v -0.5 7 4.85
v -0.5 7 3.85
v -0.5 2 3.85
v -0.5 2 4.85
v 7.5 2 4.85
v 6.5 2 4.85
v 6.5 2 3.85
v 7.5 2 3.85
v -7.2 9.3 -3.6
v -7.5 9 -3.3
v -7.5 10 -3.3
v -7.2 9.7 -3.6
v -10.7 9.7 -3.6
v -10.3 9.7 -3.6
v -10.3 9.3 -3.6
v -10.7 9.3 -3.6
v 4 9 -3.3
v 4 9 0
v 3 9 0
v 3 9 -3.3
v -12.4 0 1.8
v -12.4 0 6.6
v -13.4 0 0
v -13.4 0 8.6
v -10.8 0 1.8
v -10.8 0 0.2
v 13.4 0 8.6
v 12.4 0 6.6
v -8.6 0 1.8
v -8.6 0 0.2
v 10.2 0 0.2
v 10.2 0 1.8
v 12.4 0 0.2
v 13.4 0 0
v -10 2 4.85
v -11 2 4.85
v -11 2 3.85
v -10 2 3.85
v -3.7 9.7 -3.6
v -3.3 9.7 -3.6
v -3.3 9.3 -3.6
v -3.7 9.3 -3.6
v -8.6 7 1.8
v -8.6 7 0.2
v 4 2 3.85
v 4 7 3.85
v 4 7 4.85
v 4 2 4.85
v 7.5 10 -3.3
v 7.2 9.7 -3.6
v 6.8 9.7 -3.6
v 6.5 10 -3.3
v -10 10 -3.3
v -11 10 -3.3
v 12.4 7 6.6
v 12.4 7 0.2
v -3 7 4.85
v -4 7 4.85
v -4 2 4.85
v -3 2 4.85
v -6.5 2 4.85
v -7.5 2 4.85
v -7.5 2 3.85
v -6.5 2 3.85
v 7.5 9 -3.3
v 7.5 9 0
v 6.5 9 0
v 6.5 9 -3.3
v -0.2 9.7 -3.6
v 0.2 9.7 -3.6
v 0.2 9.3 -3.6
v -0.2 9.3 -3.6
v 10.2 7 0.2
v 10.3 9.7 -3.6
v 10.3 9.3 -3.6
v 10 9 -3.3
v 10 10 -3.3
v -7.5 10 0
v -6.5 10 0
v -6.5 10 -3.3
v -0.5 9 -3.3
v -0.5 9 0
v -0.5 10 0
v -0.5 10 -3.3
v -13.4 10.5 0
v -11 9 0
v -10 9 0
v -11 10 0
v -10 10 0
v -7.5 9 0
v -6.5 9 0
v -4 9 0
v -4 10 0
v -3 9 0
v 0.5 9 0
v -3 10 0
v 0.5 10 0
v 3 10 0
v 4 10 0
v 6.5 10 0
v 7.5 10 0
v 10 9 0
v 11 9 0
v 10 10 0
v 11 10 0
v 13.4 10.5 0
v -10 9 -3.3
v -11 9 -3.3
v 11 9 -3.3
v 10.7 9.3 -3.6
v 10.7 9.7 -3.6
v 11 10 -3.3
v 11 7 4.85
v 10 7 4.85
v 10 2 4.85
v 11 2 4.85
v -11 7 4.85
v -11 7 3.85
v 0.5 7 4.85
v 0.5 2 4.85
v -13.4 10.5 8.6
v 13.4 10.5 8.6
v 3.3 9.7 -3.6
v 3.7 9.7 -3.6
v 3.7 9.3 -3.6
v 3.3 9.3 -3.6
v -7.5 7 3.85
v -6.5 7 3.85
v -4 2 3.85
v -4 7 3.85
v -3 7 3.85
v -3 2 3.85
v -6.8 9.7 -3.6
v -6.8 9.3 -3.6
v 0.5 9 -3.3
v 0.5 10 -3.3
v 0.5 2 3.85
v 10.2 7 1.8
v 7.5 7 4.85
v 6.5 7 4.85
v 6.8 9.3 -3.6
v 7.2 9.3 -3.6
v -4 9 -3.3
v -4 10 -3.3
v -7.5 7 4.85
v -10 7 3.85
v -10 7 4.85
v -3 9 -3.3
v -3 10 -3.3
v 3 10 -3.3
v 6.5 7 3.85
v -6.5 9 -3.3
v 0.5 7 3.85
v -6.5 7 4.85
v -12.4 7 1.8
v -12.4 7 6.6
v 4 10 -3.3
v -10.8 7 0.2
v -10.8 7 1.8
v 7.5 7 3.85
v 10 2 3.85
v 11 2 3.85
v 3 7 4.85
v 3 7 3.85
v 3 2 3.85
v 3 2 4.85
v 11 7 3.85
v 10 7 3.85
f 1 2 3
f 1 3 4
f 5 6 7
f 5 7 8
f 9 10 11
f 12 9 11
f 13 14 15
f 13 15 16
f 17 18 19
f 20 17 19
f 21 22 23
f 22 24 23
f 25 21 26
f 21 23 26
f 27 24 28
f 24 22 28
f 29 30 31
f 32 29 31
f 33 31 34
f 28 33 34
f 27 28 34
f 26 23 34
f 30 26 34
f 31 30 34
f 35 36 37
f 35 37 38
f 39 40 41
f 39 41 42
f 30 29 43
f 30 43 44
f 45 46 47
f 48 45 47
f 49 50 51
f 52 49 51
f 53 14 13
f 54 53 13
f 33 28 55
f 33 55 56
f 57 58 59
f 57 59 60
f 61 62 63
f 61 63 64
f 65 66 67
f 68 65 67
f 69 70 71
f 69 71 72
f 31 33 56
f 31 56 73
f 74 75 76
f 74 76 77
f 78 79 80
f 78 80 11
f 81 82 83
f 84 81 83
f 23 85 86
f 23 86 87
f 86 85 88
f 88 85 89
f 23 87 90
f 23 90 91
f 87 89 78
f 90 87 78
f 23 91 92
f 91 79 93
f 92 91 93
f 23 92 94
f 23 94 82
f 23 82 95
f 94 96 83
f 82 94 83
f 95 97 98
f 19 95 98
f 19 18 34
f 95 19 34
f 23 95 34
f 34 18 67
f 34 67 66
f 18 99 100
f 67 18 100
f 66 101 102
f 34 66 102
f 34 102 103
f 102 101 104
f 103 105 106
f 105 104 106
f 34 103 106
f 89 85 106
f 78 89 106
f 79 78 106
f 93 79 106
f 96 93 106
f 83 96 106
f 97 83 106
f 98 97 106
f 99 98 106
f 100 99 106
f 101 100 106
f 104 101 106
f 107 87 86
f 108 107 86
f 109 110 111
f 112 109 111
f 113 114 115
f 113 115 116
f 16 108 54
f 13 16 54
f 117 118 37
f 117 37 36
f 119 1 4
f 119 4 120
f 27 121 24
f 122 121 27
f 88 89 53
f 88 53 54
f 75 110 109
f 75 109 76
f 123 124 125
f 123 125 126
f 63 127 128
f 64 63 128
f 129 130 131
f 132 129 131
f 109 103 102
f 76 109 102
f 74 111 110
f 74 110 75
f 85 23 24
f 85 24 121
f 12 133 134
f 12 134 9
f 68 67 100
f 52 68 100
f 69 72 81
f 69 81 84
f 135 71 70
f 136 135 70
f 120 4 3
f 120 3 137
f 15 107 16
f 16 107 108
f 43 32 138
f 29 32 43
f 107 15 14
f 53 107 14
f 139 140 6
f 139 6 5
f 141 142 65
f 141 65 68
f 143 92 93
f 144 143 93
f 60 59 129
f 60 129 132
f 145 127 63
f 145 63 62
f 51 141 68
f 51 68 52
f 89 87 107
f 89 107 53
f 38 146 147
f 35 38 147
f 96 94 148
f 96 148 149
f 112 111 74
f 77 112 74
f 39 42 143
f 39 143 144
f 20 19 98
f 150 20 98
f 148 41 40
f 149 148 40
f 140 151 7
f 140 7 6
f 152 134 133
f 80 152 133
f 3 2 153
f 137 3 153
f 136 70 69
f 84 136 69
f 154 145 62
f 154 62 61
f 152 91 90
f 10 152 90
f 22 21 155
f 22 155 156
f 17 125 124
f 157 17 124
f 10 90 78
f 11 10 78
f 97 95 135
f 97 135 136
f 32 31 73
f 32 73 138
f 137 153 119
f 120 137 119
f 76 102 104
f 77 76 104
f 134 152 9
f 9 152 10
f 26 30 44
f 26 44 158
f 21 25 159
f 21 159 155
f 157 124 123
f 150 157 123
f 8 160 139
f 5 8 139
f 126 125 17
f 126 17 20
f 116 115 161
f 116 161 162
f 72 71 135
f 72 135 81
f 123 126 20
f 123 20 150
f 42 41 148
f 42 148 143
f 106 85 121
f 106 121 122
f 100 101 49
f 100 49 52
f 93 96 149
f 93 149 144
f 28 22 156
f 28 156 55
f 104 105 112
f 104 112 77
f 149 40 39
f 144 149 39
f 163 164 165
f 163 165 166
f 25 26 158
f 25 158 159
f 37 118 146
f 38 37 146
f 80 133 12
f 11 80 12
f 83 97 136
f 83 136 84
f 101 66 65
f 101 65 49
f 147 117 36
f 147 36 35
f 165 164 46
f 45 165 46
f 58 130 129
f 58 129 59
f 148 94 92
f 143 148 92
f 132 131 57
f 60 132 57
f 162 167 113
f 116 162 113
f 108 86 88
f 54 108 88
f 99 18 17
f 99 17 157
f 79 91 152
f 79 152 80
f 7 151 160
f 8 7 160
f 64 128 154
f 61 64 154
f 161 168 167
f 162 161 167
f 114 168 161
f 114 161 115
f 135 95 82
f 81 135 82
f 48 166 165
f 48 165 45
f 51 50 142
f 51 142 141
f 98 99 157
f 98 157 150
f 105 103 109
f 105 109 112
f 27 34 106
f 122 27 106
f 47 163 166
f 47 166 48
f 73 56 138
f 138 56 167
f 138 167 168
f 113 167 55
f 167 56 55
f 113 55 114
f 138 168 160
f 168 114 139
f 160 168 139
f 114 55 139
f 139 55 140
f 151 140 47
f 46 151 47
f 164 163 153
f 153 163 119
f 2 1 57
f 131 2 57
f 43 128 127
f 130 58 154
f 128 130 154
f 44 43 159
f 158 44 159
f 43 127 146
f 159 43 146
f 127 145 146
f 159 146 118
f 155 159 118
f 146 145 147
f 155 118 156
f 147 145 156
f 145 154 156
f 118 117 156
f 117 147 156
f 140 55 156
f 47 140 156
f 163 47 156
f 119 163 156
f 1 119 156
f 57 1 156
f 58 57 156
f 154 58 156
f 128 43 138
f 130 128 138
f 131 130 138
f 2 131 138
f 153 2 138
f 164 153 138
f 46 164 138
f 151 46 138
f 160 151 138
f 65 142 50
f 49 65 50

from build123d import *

# Parameters (mm, degrees)
SKETCH_1_W                         = 26.8
SKETCH_1_H                         = 10.5
EXTRUDE_1_DEPTH                    = 8.6
CUT_EXTRUDE_1_DEPTH                = 7
EXTRUDE_START                      = -5
SKETCH_3_W                         = 1
SKETCH_3_H                         = 1
EXTRUDE_2_DEPTH                    = 8.6
CHAMFER_1_SIZE                     = 0.3
SKETCH_4_W                         = 1
SKETCH_4_H                         = 1
EXTRUDE_3_DEPTH                    = 5
PATTERN_LINEAR_1_COUNT             = 7
PATTERN_LINEAR_1_PITCH             = 3.5
CHAMFER_1_OF_PATTERN_LINEAR_1_SIZE = 0.3


with BuildPart() as part:
    # Эскиз1 → Бобышка-Вытянуть1 (new body)
    with BuildSketch(Plane.XY):
        with Locations((0, 5.25)):
            Rectangle(SKETCH_1_W, SKETCH_1_H)
    extrude(amount=EXTRUDE_1_DEPTH)

    # Эскиз2 → Вырез-Вытянуть1 (cut)
    with BuildSketch(Plane.XZ):
        Polygon((-12.4, 6.6), (12.4, 6.6), (12.4, 0.2), (10.2, 0.2), (10.2, 1.8), (-8.6, 1.8), (-8.6, 0.2), (-10.8, 0.2), (-10.8, 1.8), (-12.4, 1.8), align=None)
    extrude(amount=-CUT_EXTRUDE_1_DEPTH, mode=Mode.SUBTRACT)

    # Эскиз3 → Бобышка-Вытянуть2 (add)
    with BuildSketch(Plane(origin=(0, 0, 0), x_dir=(-1, 0, 0), z_dir=(0, 0, -1)).offset(EXTRUDE_START)):
        with Locations((10.5, 9.5)):
            Rectangle(SKETCH_3_W, SKETCH_3_H)
    extrude_2 = extrude(amount=EXTRUDE_2_DEPTH)

    # Фаска1
    chamfer_1_edges = [part.edges().sort_by_distance(p)[0] for p in [
        (-10, 9.5, -3.6),
        (-10.5, 9, -3.6),
        (-11, 9.5, -3.6),
        (-10.5, 10, -3.6),
    ]]
    chamfer(chamfer_1_edges, length=CHAMFER_1_SIZE)

    # Эскиз4 → Бобышка-Вытянуть3 (add)
    with BuildSketch(Plane.XZ.offset(-7)):
        with Locations((-10.5, 4.35)):
            Rectangle(SKETCH_4_W, SKETCH_4_H)
    extrude_3 = extrude(amount=EXTRUDE_3_DEPTH)

    # Линейный массив1: Бобышка-Вытянуть2, Бобышка-Вытянуть3 ×7
    with Locations(*[(i * PATTERN_LINEAR_1_PITCH, 0, 0) for i in range(1, PATTERN_LINEAR_1_COUNT)]):
        add(extrude_2)
        add(extrude_3)

    # Фаска1 of Линейный массив1
    chamfer_1_of_pattern_linear_1_edges = [part.edges().sort_by_distance(p)[0] for p in [
        (-6.5, 9.5, -3.6),
        (-7, 9, -3.6),
        (-7.5, 9.5, -3.6),
        (-7, 10, -3.6),
        (-3, 9.5, -3.6),
        (-3.5, 9, -3.6),
        (-4, 9.5, -3.6),
        (-3.5, 10, -3.6),
        (0.5, 9.5, -3.6),
        (0, 9, -3.6),
        (-0.5, 9.5, -3.6),
        (0, 10, -3.6),
        (4, 9.5, -3.6),
        (3.5, 9, -3.6),
        (3, 9.5, -3.6),
        (3.5, 10, -3.6),
        (7.5, 9.5, -3.6),
        (7, 9, -3.6),
        (6.5, 9.5, -3.6),
        (7, 10, -3.6),
        (11, 9.5, -3.6),
        (10.5, 9, -3.6),
        (10, 9.5, -3.6),
        (10.5, 10, -3.6),
    ]]
    chamfer(chamfer_1_of_pattern_linear_1_edges, length=CHAMFER_1_OF_PATTERN_LINEAR_1_SIZE)


solid = part.part
